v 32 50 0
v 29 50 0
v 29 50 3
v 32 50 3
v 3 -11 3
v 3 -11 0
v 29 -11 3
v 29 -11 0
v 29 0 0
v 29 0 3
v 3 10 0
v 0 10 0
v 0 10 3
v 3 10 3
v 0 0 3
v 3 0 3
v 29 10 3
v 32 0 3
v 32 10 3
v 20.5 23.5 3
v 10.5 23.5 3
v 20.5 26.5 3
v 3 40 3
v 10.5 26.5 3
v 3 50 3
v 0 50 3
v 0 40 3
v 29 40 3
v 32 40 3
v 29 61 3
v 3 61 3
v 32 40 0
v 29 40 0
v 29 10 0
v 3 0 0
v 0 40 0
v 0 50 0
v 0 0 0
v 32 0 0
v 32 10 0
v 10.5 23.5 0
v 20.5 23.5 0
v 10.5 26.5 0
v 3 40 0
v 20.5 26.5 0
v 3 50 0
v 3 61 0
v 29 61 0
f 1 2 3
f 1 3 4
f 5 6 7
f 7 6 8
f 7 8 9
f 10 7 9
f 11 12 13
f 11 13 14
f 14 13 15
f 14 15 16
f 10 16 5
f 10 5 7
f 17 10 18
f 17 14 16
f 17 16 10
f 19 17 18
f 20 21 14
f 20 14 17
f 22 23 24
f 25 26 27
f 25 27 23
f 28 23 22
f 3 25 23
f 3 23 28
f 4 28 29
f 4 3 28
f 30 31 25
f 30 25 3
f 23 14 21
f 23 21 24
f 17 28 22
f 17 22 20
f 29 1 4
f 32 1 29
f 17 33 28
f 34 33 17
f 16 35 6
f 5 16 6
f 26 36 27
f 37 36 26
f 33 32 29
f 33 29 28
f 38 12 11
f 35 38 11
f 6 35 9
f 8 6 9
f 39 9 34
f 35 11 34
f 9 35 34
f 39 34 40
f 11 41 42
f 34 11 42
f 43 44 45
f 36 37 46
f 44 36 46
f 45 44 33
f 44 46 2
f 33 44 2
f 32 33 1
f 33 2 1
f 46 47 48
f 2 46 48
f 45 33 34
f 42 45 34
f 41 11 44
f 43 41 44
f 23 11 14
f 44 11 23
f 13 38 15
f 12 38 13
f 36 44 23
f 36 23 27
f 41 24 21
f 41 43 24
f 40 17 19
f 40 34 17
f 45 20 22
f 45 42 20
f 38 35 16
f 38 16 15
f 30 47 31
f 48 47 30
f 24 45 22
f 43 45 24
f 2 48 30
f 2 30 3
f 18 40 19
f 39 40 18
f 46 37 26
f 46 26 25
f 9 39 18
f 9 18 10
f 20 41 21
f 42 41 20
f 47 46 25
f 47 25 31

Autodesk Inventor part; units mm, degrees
ref_plane "YZ Plane" through (0, 0, 0) normal (1, 0, 0) x (0, 1, 0)
ref_plane "XZ Plane" through (0, 0, 0) normal (0, 1, 0) x (-1, 0, 0)
ref_plane "XY Plane" through (0, 0, 0) normal (0, 0, 1) x (1, 0, 0)
sketch "Sketch1" plane through (0, 0, 0) normal (0, 0, 1) x (1, 0, 0)
  line L0 (0, 0) -> (0, 10)
  line L1 (0, 10) -> (3, 10)
  line L2 (3, 10) -> (3, 40)
  line L3 (3, 40) -> (0, 40)
  line L4 (0, 40) -> (0, 50)
  line L5 (32, 50) -> (32, 40)
  line L6 (32, 40) -> (29, 40)
  line L7 (29, 40) -> (29, 10)
  line L8 (29, 10) -> (32, 10)
  line L9 (32, 10) -> (32, 0)
  line L10 (10.5, 23.5) -> (20.5, 23.5)
  line L11 (20.5, 23.5) -> (20.5, 26.5)
  line L12 (20.5, 26.5) -> (10.5, 26.5)
  line L13 (10.5, 26.5) -> (10.5, 23.5)
  line L14 (3, 50) -> (3, 61)
  line L15 (3, 61) -> (29, 61)
  line L16 (29, 61) -> (29, 50)
  line L17 (3, 0) -> (3, -11)
  line L18 (3, -11) -> (29, -11)
  line L19 (29, -11) -> (29, 0)
  line L20 (0, 50) -> (3, 50)
  line L21 (29, 50) -> (32, 50)
  line L22 (32, 0) -> (29, 0)
  line L23 (3, 0) -> (0, 0)
  dimension "d19" = 10
  dimension "d20" = 3
  dimension "d22" = 10
  dimension "d23" = 3
  dimension "d24" = 30
  dimension "d25" = 3
  dimension "d26" = 10
  dimension "d27" = 32
  dimension "d28" = 10
  dimension "d29" = 3
  dimension "d30" = 3
  dimension "d31" = 10
  dimension "d32" = 7.5
  dimension "d35" = 30
  dimension "d36" = 72
  dimension "d39" = 34.5
  dimension "d40" = 26
  dimension "d41" = 26
  dimension "d42" = 11
  dimension "d43" = 11
extrude "Extrusion1" add sketch "Sketch1" along normal blind 3
properties part number "OpenROV 2.3 Dev EChassis Light Plate"
